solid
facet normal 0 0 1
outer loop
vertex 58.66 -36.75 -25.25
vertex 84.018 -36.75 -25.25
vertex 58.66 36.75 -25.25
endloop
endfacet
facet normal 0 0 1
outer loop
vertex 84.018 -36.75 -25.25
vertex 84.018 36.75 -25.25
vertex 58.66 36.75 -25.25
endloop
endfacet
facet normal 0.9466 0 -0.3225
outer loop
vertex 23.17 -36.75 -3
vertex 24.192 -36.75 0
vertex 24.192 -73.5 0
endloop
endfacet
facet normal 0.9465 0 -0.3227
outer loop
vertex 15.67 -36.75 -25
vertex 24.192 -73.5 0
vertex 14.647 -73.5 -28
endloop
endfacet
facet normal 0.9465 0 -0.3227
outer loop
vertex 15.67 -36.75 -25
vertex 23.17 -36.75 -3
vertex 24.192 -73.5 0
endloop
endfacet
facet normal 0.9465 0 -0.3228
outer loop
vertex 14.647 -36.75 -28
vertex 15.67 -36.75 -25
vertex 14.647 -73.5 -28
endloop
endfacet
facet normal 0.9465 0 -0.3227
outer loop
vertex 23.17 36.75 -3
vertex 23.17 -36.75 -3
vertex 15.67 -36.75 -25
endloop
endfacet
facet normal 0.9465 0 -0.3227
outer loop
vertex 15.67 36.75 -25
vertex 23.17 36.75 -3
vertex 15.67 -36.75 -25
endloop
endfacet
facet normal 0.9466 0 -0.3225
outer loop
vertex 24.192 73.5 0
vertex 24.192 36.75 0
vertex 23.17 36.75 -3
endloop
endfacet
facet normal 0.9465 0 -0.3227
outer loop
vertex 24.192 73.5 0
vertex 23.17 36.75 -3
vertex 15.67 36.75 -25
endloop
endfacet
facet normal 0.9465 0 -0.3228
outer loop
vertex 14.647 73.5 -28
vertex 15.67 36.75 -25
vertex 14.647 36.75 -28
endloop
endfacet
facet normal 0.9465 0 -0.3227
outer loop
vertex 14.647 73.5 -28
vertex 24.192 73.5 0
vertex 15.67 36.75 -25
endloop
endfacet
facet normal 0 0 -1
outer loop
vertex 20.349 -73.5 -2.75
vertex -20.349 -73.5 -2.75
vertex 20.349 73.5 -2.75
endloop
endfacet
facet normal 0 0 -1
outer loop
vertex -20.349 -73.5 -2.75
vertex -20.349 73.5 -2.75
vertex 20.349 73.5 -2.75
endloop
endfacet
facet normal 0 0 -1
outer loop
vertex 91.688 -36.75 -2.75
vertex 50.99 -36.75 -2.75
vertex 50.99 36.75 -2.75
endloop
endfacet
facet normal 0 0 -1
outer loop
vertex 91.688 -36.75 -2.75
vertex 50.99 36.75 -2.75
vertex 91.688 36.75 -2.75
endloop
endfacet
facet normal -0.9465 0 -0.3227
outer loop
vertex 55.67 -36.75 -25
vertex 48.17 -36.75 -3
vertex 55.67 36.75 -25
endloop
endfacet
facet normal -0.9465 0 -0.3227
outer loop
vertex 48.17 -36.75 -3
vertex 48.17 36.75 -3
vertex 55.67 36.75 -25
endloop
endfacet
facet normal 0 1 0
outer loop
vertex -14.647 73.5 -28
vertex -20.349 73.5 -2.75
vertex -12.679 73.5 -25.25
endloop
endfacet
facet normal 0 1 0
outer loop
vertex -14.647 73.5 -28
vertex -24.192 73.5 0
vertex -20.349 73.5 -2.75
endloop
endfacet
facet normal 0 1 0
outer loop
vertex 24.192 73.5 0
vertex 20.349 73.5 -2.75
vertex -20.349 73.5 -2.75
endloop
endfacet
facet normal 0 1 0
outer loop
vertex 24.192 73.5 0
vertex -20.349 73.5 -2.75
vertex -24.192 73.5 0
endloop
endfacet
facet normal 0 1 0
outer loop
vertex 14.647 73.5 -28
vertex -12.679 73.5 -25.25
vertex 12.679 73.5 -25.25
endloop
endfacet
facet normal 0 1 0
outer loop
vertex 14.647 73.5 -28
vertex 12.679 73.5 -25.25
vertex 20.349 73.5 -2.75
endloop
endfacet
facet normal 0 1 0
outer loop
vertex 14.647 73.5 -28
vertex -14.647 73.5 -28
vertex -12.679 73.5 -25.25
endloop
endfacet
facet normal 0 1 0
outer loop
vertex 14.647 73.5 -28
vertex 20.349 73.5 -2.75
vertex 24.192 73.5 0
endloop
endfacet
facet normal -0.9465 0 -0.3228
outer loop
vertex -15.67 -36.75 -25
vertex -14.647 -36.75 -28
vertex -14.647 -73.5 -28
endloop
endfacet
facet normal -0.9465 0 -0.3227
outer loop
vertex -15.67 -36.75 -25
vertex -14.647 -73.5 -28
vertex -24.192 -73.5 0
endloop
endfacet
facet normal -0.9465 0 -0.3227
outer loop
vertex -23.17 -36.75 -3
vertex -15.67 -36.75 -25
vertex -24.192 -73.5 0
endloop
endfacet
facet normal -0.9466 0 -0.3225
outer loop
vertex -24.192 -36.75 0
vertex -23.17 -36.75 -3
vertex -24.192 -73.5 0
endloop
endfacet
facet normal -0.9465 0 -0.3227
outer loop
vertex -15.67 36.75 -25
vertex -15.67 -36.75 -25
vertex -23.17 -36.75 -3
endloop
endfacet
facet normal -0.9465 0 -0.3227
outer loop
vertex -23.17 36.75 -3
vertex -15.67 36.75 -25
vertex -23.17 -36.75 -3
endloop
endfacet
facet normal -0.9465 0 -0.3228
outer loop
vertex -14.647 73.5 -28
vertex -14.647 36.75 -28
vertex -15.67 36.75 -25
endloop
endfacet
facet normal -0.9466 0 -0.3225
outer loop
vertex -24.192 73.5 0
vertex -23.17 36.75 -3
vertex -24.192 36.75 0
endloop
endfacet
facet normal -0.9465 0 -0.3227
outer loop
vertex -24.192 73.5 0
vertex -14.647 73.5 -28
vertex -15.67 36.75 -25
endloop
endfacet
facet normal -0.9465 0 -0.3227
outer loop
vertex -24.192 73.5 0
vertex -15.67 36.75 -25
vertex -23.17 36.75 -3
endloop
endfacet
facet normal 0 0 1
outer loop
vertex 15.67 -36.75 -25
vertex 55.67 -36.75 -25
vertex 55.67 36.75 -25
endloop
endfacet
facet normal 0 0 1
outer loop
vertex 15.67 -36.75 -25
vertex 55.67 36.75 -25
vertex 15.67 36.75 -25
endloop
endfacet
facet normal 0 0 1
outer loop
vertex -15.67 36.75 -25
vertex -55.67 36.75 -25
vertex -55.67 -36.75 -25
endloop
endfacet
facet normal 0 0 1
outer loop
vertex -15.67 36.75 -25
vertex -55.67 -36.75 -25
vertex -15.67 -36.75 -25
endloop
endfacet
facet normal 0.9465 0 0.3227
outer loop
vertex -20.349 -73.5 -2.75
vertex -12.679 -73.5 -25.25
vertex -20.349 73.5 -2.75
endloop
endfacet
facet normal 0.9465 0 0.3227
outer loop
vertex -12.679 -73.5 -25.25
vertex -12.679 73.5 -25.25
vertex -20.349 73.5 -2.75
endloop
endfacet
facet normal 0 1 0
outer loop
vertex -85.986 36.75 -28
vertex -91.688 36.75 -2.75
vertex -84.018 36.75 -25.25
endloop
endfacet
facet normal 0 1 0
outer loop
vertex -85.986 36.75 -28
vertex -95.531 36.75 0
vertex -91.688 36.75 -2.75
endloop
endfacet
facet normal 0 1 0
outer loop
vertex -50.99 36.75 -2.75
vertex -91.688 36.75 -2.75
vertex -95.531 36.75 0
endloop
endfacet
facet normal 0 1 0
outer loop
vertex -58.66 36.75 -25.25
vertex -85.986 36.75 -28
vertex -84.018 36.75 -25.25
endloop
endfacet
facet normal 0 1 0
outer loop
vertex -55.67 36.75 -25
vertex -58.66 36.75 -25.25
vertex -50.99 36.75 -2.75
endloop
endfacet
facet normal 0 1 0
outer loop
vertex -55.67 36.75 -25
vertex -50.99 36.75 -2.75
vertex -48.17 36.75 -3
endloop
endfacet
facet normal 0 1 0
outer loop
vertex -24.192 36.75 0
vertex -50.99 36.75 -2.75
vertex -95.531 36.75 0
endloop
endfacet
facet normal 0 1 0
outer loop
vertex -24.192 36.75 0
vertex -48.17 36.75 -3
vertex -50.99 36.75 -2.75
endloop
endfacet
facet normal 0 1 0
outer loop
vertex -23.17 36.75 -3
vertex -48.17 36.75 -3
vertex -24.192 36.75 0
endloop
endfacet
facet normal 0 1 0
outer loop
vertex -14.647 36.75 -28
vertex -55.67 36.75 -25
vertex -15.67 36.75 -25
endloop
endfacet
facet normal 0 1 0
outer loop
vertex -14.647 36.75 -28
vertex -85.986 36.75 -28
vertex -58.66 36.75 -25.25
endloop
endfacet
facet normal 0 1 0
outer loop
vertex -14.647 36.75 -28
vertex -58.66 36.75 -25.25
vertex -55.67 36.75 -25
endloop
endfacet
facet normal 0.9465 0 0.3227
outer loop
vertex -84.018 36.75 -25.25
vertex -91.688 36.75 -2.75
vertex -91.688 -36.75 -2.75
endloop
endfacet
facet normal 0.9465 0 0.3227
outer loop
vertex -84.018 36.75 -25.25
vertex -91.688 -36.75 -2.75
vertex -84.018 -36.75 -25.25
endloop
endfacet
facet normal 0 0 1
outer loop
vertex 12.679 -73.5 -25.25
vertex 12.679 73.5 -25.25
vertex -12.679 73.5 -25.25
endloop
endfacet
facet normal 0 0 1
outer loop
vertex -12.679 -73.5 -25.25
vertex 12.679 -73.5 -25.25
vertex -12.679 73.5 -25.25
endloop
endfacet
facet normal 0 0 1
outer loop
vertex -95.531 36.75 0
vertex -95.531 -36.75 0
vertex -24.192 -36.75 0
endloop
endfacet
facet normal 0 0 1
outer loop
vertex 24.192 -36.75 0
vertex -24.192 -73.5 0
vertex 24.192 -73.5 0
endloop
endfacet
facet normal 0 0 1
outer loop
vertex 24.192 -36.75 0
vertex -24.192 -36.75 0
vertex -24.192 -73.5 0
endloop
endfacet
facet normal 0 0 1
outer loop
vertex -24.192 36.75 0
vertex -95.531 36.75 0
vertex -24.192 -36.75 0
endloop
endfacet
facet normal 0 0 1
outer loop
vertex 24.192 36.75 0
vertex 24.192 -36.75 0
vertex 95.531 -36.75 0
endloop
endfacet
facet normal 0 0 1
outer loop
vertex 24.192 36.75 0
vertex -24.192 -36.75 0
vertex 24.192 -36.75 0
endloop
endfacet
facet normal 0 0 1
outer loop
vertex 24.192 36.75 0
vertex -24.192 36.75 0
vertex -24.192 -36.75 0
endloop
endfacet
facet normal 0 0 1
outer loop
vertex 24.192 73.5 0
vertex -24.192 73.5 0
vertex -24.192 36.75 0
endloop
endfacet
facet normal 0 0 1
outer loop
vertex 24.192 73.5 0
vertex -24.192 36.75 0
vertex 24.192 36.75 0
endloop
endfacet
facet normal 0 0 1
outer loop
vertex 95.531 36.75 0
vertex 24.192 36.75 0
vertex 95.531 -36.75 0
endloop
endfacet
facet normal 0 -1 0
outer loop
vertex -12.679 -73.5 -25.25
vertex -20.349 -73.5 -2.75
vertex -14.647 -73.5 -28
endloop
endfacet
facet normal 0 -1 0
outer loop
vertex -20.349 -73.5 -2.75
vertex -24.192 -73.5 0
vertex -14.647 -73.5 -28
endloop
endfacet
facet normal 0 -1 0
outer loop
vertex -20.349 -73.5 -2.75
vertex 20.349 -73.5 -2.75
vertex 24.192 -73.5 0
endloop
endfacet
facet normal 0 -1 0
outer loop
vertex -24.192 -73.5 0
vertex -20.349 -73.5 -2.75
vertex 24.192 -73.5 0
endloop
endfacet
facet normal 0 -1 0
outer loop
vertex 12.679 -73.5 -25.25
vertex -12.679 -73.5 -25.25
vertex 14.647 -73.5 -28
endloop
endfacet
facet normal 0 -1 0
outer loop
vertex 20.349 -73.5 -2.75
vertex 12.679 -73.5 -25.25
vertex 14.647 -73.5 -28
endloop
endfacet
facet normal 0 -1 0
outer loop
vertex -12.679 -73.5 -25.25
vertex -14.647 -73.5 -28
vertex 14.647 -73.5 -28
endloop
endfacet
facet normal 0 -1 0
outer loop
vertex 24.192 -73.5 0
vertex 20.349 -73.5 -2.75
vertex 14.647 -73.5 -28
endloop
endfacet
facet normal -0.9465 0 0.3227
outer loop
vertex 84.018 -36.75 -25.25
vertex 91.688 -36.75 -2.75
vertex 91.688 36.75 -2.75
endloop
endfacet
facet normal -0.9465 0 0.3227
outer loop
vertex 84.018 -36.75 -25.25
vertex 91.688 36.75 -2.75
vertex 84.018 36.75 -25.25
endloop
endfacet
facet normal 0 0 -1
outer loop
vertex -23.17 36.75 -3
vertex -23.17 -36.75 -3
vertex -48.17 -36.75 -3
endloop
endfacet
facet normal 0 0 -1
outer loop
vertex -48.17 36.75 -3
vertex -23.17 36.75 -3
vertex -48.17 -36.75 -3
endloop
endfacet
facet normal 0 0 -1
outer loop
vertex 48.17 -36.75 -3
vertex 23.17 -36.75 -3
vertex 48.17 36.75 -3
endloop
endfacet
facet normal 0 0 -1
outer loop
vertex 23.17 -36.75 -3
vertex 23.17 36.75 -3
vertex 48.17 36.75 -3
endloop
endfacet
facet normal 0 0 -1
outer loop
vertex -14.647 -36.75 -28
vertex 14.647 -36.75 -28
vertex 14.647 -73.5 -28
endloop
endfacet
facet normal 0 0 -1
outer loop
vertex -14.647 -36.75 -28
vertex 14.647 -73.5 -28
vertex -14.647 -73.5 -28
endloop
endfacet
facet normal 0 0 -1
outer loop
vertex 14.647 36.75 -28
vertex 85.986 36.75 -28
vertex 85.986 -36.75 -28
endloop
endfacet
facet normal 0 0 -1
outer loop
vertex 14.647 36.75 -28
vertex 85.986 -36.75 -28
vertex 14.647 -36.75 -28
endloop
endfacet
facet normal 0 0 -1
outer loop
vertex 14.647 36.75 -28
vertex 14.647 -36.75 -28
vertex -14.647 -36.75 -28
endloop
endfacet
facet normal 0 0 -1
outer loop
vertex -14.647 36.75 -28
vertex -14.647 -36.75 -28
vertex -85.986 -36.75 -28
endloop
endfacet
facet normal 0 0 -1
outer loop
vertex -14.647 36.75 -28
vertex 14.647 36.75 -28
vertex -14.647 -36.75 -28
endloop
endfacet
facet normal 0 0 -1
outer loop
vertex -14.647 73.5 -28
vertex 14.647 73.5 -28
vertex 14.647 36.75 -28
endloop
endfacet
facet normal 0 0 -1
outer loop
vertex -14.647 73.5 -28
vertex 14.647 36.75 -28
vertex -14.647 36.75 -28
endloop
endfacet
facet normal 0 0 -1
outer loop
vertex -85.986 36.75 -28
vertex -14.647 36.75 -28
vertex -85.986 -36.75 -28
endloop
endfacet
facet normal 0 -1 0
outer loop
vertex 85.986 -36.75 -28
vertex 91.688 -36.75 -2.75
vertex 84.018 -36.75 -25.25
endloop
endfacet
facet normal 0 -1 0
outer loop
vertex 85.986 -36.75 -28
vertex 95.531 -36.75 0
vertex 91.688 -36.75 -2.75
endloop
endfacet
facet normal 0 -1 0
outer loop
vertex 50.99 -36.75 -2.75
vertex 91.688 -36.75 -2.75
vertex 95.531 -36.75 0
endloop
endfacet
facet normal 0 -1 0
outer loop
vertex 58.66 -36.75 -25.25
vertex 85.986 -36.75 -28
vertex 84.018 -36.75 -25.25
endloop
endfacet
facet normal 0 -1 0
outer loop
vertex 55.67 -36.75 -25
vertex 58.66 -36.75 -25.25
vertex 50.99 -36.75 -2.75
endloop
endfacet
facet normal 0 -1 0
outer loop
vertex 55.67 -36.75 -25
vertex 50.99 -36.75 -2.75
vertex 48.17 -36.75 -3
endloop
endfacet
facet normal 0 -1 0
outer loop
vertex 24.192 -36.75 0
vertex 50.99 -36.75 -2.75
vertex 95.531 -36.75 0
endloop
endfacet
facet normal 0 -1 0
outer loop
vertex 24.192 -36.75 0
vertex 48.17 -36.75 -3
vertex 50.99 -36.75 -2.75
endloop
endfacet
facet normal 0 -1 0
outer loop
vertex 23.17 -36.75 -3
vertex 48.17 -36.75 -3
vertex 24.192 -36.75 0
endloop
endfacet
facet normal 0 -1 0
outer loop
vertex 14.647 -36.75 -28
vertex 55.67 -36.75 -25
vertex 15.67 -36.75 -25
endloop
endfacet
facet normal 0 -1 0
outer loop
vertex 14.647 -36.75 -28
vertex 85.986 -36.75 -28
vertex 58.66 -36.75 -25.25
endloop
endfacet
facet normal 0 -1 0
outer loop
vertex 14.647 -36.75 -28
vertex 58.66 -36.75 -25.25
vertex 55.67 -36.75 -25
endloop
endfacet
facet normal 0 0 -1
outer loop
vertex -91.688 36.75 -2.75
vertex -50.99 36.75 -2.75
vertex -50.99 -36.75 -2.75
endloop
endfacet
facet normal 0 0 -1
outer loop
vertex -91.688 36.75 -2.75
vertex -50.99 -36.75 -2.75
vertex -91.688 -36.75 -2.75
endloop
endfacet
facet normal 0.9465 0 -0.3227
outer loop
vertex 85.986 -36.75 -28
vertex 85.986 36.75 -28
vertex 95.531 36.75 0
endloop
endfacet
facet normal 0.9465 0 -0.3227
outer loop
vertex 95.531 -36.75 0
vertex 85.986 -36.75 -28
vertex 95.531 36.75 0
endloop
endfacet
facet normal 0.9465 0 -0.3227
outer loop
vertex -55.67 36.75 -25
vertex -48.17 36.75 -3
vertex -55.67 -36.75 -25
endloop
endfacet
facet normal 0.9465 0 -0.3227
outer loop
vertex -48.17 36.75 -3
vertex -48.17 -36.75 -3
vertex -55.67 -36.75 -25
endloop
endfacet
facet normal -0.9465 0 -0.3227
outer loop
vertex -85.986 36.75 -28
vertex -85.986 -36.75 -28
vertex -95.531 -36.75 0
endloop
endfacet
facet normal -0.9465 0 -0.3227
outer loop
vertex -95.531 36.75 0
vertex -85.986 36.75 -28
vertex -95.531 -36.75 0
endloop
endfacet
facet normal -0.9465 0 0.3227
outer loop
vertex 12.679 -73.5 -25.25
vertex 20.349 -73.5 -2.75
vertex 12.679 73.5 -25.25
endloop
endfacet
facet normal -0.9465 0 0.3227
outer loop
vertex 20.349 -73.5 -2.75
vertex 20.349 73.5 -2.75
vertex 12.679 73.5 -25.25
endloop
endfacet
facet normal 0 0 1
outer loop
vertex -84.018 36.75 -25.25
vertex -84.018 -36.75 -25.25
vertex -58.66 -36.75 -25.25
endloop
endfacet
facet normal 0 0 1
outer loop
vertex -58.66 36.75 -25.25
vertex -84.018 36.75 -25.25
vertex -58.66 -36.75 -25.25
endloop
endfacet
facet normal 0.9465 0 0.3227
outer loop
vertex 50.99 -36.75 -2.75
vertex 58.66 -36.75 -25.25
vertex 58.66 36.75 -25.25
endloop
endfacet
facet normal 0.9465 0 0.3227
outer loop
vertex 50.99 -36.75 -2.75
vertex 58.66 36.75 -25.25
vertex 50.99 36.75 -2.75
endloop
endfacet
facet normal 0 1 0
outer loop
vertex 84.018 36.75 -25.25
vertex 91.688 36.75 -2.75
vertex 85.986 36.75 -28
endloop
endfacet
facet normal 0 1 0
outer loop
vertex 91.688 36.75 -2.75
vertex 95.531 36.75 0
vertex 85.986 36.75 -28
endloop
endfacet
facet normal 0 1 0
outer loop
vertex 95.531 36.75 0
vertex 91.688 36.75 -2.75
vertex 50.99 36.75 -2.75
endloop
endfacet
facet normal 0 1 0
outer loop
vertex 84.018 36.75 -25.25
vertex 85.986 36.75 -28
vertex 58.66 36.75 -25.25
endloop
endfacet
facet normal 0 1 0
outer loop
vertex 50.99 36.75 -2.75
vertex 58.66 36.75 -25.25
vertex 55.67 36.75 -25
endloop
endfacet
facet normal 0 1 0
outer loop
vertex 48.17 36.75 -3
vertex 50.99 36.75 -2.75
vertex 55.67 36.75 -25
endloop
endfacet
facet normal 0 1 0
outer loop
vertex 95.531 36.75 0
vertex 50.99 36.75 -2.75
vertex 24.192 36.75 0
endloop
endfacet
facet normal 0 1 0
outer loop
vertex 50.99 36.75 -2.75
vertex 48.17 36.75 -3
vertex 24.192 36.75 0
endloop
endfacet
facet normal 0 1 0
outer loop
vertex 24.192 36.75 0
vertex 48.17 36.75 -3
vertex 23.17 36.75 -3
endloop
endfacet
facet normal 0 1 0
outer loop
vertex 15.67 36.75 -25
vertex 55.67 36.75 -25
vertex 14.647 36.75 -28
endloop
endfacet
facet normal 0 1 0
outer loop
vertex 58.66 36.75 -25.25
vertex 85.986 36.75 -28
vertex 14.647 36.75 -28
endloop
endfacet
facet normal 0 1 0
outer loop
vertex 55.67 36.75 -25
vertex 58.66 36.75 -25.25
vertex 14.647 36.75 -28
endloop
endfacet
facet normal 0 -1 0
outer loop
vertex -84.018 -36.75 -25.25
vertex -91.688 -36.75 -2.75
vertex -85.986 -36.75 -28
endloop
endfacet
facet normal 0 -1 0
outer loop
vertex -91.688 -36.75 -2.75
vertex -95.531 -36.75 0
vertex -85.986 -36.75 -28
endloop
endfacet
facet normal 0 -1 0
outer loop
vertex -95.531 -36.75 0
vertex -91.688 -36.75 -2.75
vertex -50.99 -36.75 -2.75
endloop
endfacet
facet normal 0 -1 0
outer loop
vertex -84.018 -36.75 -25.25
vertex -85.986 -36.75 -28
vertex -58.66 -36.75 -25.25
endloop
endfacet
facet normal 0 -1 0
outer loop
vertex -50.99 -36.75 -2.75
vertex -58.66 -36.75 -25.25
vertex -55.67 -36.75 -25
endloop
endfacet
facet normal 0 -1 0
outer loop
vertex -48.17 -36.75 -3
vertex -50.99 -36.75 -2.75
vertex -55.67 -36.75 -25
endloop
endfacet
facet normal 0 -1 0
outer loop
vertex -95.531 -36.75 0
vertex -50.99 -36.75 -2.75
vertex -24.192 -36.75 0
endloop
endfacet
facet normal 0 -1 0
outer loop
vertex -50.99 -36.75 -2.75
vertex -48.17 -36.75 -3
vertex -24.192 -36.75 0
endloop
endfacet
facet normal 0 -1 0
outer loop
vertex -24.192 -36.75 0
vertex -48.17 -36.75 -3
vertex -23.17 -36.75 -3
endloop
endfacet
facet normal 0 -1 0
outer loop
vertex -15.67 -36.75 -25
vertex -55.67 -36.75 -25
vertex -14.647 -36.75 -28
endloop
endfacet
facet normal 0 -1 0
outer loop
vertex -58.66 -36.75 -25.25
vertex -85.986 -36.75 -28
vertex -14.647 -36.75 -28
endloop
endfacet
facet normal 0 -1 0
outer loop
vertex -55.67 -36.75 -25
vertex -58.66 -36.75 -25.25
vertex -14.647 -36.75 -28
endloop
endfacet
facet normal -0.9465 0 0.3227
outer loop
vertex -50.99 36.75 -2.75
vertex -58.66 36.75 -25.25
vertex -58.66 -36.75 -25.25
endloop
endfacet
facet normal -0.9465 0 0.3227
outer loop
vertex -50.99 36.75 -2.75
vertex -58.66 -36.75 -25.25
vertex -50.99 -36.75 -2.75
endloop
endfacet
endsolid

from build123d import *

# Parameters (mm, degrees)
BOSS_EXTRUDE1_DEPTH = 73.5
BOSS_EXTRUDE2_DEPTH = 36.75


with BuildPart() as part:
    # Sketch2 → Boss-Extrude1 (new, symmetric)
    with BuildSketch(Plane(origin=(0, 0, 0), x_dir=(1, 0, 0), z_dir=(0, 1, 0))):
        Polygon((24.192265263, 0), (14.646810718, 28), (-14.646810718, 28), (-24.192265263, 0), align=None)
        Polygon((12.678900893, 25.25), (-12.678900893, 25.25), (-20.349355439, 2.75), (20.349355439, 2.75), align=None, mode=Mode.SUBTRACT)
    extrude(amount=BOSS_EXTRUDE1_DEPTH, both=True)

    # Sketch3 → Boss-Extrude2 (add, symmetric)
    # profile 1 of 2: a face of its own
    with BuildSketch(Plane(origin=(0, 0, 0), x_dir=(1, 0, 0), z_dir=(0, 1, 0))):
        Polygon((-23.169537991, 3), (-48.169537991, 3), (-55.669537991, 25), (-15.669537991, 25), (-14.646810718, 28), (-85.985886699, 28), (-95.531341245, 0), (-24.192265263, 0), align=None)
        Polygon((-58.660175088, 25.25), (-50.989720543, 2.75), (-91.68843142, 2.75), (-84.017976875, 25.25), align=None, mode=Mode.SUBTRACT)
    # profile 2 of 2: a face of its own
    with BuildSketch(Plane(origin=(0, 0, 0), x_dir=(1, 0, 0), z_dir=(0, 1, 0))):
        Polygon((24.192265263, 0), (23.169537991, 3), (48.169537991, 3), (55.669537991, 25), (15.669537991, 25), (14.646810718, 28), (85.985886699, 28), (95.531341245, 0), align=None)
        Polygon((84.017976875, 25.25), (58.660175088, 25.25), (50.989720543, 2.75), (91.68843142, 2.75), align=None, mode=Mode.SUBTRACT)
    extrude(amount=BOSS_EXTRUDE2_DEPTH, both=True)


solid = part.part
